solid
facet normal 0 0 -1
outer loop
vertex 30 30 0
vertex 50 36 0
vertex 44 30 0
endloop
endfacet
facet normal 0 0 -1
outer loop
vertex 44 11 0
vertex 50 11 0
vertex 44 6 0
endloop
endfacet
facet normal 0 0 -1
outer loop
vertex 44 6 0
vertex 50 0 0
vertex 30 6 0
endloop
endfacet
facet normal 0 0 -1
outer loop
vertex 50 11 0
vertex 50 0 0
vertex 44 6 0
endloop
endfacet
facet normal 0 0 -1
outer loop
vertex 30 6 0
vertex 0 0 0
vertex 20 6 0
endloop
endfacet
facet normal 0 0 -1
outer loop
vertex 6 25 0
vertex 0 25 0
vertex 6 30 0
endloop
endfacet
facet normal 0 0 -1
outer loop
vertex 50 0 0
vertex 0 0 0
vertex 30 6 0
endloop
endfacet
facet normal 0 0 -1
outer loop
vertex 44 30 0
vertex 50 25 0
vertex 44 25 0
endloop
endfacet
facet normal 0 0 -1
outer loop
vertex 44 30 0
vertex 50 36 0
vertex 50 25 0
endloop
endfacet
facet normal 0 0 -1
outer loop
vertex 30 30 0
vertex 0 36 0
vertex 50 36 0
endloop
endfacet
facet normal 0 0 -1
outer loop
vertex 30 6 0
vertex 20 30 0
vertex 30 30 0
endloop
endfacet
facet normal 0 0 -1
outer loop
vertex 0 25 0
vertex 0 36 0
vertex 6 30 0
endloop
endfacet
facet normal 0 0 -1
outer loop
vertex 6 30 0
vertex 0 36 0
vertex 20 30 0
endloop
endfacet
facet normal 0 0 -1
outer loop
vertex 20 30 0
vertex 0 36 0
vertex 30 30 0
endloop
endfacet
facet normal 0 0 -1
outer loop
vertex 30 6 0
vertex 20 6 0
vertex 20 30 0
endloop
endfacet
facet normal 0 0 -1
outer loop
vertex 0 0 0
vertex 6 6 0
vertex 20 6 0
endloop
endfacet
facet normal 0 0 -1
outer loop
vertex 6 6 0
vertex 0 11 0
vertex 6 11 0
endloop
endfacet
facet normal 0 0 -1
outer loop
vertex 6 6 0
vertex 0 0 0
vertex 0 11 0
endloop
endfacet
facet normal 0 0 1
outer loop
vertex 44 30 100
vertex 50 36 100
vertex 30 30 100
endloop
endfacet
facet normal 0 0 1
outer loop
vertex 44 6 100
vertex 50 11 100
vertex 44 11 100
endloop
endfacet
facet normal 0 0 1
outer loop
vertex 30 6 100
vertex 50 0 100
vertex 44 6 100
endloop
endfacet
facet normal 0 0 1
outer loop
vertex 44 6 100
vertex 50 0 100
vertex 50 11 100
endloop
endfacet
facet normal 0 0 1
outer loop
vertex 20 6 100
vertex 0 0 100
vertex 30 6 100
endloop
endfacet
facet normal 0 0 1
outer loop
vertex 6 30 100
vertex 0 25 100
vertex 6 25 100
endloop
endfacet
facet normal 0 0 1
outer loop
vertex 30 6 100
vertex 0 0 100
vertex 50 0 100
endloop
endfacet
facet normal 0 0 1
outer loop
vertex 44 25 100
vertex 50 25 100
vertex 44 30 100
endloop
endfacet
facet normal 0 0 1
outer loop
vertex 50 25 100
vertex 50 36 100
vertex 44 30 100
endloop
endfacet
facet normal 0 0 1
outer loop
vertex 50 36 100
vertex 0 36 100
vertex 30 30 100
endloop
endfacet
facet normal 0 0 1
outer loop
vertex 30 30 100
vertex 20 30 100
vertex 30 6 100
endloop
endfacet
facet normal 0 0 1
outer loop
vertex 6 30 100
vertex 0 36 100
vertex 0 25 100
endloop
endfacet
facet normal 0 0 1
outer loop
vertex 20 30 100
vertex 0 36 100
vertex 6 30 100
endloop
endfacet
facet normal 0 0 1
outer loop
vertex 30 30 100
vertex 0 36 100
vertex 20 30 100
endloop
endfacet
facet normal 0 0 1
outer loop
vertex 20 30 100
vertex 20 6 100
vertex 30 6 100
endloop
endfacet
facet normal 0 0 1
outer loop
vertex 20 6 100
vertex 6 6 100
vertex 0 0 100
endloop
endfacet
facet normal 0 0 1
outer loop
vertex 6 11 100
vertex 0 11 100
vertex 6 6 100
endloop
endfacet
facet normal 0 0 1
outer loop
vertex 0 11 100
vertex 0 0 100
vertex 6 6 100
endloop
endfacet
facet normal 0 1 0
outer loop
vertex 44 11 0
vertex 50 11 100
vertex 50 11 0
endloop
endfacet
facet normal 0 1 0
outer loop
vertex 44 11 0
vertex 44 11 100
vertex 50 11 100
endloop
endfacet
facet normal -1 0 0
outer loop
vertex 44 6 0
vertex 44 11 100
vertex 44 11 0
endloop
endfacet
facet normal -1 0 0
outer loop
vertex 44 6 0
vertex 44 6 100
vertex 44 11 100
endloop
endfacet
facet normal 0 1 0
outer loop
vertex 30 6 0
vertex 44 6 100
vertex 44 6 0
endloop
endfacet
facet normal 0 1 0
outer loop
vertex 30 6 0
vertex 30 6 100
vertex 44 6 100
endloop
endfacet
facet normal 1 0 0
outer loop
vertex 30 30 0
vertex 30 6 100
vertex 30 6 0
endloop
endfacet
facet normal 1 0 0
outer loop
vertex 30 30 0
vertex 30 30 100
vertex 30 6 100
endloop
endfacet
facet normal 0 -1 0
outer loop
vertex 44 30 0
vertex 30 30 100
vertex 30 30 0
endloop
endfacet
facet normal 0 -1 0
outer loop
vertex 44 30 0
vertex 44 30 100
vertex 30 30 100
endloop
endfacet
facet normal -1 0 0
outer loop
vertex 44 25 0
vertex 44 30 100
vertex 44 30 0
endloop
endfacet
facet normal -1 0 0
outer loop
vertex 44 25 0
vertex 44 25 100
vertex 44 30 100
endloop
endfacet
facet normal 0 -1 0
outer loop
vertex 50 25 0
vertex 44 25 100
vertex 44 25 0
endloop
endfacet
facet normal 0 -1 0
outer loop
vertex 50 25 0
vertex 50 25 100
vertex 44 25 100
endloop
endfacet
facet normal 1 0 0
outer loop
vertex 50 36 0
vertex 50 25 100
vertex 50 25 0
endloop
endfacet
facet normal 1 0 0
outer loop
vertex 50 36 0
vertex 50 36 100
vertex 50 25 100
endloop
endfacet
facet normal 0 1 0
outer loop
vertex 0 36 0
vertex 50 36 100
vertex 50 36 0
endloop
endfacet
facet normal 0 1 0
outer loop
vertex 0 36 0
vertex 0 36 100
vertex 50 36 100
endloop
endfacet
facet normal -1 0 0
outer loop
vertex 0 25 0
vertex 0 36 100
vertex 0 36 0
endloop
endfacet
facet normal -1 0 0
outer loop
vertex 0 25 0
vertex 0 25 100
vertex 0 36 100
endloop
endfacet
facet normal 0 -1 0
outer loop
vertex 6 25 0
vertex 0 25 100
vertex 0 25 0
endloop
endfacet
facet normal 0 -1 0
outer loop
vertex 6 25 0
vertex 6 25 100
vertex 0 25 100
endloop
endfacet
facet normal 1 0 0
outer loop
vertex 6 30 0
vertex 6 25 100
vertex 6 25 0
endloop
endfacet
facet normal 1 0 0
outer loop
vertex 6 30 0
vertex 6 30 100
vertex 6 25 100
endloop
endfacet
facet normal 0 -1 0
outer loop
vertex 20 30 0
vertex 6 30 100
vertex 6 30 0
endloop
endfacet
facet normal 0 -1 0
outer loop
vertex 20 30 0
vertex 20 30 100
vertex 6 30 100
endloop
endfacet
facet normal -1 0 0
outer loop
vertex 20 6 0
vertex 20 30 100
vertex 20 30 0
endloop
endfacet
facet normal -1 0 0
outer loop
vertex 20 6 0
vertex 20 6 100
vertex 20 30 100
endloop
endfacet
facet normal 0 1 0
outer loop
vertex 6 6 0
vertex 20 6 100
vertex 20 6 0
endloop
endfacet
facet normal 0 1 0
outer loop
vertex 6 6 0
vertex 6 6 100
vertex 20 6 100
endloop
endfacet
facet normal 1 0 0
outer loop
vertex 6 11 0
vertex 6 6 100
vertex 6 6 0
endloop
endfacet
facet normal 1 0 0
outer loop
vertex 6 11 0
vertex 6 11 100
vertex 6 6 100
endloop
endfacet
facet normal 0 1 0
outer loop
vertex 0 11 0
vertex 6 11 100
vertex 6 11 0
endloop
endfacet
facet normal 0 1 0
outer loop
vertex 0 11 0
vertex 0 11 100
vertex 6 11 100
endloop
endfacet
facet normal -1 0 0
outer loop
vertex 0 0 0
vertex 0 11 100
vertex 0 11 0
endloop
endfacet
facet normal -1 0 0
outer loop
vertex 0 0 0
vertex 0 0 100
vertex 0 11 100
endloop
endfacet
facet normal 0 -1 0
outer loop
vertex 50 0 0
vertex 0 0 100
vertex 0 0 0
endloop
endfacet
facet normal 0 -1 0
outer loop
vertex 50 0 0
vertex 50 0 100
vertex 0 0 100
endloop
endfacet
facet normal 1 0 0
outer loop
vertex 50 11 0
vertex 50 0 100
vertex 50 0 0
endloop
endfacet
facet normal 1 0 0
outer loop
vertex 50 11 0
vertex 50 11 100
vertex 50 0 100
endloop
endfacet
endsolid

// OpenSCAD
$fn = 32;

// ----------------------------------------------------------------------
// T-slot rail: 50 x 36 mm section, 100 mm long
// ----------------------------------------------------------------------

// --- parameters (mm) ---
profile_height = 100;     // extrusion height
profile_points = 20;      // points of the closed outline

profile = [[0, 0], [50, 0], [50, 11], [44, 11], [44, 6], [30, 6], [30, 30], [44, 30], [44, 25], [50, 25], [50, 36], [0, 36], [0, 25], [6, 25], [6, 30], [20, 30], [20, 6], [6, 6], [6, 11], [0, 11]];  // single closed polygon, 20 points, counter clockwise

// --- the one profile operation ---
linear_extrude(height = profile_height) polygon(points = profile);
